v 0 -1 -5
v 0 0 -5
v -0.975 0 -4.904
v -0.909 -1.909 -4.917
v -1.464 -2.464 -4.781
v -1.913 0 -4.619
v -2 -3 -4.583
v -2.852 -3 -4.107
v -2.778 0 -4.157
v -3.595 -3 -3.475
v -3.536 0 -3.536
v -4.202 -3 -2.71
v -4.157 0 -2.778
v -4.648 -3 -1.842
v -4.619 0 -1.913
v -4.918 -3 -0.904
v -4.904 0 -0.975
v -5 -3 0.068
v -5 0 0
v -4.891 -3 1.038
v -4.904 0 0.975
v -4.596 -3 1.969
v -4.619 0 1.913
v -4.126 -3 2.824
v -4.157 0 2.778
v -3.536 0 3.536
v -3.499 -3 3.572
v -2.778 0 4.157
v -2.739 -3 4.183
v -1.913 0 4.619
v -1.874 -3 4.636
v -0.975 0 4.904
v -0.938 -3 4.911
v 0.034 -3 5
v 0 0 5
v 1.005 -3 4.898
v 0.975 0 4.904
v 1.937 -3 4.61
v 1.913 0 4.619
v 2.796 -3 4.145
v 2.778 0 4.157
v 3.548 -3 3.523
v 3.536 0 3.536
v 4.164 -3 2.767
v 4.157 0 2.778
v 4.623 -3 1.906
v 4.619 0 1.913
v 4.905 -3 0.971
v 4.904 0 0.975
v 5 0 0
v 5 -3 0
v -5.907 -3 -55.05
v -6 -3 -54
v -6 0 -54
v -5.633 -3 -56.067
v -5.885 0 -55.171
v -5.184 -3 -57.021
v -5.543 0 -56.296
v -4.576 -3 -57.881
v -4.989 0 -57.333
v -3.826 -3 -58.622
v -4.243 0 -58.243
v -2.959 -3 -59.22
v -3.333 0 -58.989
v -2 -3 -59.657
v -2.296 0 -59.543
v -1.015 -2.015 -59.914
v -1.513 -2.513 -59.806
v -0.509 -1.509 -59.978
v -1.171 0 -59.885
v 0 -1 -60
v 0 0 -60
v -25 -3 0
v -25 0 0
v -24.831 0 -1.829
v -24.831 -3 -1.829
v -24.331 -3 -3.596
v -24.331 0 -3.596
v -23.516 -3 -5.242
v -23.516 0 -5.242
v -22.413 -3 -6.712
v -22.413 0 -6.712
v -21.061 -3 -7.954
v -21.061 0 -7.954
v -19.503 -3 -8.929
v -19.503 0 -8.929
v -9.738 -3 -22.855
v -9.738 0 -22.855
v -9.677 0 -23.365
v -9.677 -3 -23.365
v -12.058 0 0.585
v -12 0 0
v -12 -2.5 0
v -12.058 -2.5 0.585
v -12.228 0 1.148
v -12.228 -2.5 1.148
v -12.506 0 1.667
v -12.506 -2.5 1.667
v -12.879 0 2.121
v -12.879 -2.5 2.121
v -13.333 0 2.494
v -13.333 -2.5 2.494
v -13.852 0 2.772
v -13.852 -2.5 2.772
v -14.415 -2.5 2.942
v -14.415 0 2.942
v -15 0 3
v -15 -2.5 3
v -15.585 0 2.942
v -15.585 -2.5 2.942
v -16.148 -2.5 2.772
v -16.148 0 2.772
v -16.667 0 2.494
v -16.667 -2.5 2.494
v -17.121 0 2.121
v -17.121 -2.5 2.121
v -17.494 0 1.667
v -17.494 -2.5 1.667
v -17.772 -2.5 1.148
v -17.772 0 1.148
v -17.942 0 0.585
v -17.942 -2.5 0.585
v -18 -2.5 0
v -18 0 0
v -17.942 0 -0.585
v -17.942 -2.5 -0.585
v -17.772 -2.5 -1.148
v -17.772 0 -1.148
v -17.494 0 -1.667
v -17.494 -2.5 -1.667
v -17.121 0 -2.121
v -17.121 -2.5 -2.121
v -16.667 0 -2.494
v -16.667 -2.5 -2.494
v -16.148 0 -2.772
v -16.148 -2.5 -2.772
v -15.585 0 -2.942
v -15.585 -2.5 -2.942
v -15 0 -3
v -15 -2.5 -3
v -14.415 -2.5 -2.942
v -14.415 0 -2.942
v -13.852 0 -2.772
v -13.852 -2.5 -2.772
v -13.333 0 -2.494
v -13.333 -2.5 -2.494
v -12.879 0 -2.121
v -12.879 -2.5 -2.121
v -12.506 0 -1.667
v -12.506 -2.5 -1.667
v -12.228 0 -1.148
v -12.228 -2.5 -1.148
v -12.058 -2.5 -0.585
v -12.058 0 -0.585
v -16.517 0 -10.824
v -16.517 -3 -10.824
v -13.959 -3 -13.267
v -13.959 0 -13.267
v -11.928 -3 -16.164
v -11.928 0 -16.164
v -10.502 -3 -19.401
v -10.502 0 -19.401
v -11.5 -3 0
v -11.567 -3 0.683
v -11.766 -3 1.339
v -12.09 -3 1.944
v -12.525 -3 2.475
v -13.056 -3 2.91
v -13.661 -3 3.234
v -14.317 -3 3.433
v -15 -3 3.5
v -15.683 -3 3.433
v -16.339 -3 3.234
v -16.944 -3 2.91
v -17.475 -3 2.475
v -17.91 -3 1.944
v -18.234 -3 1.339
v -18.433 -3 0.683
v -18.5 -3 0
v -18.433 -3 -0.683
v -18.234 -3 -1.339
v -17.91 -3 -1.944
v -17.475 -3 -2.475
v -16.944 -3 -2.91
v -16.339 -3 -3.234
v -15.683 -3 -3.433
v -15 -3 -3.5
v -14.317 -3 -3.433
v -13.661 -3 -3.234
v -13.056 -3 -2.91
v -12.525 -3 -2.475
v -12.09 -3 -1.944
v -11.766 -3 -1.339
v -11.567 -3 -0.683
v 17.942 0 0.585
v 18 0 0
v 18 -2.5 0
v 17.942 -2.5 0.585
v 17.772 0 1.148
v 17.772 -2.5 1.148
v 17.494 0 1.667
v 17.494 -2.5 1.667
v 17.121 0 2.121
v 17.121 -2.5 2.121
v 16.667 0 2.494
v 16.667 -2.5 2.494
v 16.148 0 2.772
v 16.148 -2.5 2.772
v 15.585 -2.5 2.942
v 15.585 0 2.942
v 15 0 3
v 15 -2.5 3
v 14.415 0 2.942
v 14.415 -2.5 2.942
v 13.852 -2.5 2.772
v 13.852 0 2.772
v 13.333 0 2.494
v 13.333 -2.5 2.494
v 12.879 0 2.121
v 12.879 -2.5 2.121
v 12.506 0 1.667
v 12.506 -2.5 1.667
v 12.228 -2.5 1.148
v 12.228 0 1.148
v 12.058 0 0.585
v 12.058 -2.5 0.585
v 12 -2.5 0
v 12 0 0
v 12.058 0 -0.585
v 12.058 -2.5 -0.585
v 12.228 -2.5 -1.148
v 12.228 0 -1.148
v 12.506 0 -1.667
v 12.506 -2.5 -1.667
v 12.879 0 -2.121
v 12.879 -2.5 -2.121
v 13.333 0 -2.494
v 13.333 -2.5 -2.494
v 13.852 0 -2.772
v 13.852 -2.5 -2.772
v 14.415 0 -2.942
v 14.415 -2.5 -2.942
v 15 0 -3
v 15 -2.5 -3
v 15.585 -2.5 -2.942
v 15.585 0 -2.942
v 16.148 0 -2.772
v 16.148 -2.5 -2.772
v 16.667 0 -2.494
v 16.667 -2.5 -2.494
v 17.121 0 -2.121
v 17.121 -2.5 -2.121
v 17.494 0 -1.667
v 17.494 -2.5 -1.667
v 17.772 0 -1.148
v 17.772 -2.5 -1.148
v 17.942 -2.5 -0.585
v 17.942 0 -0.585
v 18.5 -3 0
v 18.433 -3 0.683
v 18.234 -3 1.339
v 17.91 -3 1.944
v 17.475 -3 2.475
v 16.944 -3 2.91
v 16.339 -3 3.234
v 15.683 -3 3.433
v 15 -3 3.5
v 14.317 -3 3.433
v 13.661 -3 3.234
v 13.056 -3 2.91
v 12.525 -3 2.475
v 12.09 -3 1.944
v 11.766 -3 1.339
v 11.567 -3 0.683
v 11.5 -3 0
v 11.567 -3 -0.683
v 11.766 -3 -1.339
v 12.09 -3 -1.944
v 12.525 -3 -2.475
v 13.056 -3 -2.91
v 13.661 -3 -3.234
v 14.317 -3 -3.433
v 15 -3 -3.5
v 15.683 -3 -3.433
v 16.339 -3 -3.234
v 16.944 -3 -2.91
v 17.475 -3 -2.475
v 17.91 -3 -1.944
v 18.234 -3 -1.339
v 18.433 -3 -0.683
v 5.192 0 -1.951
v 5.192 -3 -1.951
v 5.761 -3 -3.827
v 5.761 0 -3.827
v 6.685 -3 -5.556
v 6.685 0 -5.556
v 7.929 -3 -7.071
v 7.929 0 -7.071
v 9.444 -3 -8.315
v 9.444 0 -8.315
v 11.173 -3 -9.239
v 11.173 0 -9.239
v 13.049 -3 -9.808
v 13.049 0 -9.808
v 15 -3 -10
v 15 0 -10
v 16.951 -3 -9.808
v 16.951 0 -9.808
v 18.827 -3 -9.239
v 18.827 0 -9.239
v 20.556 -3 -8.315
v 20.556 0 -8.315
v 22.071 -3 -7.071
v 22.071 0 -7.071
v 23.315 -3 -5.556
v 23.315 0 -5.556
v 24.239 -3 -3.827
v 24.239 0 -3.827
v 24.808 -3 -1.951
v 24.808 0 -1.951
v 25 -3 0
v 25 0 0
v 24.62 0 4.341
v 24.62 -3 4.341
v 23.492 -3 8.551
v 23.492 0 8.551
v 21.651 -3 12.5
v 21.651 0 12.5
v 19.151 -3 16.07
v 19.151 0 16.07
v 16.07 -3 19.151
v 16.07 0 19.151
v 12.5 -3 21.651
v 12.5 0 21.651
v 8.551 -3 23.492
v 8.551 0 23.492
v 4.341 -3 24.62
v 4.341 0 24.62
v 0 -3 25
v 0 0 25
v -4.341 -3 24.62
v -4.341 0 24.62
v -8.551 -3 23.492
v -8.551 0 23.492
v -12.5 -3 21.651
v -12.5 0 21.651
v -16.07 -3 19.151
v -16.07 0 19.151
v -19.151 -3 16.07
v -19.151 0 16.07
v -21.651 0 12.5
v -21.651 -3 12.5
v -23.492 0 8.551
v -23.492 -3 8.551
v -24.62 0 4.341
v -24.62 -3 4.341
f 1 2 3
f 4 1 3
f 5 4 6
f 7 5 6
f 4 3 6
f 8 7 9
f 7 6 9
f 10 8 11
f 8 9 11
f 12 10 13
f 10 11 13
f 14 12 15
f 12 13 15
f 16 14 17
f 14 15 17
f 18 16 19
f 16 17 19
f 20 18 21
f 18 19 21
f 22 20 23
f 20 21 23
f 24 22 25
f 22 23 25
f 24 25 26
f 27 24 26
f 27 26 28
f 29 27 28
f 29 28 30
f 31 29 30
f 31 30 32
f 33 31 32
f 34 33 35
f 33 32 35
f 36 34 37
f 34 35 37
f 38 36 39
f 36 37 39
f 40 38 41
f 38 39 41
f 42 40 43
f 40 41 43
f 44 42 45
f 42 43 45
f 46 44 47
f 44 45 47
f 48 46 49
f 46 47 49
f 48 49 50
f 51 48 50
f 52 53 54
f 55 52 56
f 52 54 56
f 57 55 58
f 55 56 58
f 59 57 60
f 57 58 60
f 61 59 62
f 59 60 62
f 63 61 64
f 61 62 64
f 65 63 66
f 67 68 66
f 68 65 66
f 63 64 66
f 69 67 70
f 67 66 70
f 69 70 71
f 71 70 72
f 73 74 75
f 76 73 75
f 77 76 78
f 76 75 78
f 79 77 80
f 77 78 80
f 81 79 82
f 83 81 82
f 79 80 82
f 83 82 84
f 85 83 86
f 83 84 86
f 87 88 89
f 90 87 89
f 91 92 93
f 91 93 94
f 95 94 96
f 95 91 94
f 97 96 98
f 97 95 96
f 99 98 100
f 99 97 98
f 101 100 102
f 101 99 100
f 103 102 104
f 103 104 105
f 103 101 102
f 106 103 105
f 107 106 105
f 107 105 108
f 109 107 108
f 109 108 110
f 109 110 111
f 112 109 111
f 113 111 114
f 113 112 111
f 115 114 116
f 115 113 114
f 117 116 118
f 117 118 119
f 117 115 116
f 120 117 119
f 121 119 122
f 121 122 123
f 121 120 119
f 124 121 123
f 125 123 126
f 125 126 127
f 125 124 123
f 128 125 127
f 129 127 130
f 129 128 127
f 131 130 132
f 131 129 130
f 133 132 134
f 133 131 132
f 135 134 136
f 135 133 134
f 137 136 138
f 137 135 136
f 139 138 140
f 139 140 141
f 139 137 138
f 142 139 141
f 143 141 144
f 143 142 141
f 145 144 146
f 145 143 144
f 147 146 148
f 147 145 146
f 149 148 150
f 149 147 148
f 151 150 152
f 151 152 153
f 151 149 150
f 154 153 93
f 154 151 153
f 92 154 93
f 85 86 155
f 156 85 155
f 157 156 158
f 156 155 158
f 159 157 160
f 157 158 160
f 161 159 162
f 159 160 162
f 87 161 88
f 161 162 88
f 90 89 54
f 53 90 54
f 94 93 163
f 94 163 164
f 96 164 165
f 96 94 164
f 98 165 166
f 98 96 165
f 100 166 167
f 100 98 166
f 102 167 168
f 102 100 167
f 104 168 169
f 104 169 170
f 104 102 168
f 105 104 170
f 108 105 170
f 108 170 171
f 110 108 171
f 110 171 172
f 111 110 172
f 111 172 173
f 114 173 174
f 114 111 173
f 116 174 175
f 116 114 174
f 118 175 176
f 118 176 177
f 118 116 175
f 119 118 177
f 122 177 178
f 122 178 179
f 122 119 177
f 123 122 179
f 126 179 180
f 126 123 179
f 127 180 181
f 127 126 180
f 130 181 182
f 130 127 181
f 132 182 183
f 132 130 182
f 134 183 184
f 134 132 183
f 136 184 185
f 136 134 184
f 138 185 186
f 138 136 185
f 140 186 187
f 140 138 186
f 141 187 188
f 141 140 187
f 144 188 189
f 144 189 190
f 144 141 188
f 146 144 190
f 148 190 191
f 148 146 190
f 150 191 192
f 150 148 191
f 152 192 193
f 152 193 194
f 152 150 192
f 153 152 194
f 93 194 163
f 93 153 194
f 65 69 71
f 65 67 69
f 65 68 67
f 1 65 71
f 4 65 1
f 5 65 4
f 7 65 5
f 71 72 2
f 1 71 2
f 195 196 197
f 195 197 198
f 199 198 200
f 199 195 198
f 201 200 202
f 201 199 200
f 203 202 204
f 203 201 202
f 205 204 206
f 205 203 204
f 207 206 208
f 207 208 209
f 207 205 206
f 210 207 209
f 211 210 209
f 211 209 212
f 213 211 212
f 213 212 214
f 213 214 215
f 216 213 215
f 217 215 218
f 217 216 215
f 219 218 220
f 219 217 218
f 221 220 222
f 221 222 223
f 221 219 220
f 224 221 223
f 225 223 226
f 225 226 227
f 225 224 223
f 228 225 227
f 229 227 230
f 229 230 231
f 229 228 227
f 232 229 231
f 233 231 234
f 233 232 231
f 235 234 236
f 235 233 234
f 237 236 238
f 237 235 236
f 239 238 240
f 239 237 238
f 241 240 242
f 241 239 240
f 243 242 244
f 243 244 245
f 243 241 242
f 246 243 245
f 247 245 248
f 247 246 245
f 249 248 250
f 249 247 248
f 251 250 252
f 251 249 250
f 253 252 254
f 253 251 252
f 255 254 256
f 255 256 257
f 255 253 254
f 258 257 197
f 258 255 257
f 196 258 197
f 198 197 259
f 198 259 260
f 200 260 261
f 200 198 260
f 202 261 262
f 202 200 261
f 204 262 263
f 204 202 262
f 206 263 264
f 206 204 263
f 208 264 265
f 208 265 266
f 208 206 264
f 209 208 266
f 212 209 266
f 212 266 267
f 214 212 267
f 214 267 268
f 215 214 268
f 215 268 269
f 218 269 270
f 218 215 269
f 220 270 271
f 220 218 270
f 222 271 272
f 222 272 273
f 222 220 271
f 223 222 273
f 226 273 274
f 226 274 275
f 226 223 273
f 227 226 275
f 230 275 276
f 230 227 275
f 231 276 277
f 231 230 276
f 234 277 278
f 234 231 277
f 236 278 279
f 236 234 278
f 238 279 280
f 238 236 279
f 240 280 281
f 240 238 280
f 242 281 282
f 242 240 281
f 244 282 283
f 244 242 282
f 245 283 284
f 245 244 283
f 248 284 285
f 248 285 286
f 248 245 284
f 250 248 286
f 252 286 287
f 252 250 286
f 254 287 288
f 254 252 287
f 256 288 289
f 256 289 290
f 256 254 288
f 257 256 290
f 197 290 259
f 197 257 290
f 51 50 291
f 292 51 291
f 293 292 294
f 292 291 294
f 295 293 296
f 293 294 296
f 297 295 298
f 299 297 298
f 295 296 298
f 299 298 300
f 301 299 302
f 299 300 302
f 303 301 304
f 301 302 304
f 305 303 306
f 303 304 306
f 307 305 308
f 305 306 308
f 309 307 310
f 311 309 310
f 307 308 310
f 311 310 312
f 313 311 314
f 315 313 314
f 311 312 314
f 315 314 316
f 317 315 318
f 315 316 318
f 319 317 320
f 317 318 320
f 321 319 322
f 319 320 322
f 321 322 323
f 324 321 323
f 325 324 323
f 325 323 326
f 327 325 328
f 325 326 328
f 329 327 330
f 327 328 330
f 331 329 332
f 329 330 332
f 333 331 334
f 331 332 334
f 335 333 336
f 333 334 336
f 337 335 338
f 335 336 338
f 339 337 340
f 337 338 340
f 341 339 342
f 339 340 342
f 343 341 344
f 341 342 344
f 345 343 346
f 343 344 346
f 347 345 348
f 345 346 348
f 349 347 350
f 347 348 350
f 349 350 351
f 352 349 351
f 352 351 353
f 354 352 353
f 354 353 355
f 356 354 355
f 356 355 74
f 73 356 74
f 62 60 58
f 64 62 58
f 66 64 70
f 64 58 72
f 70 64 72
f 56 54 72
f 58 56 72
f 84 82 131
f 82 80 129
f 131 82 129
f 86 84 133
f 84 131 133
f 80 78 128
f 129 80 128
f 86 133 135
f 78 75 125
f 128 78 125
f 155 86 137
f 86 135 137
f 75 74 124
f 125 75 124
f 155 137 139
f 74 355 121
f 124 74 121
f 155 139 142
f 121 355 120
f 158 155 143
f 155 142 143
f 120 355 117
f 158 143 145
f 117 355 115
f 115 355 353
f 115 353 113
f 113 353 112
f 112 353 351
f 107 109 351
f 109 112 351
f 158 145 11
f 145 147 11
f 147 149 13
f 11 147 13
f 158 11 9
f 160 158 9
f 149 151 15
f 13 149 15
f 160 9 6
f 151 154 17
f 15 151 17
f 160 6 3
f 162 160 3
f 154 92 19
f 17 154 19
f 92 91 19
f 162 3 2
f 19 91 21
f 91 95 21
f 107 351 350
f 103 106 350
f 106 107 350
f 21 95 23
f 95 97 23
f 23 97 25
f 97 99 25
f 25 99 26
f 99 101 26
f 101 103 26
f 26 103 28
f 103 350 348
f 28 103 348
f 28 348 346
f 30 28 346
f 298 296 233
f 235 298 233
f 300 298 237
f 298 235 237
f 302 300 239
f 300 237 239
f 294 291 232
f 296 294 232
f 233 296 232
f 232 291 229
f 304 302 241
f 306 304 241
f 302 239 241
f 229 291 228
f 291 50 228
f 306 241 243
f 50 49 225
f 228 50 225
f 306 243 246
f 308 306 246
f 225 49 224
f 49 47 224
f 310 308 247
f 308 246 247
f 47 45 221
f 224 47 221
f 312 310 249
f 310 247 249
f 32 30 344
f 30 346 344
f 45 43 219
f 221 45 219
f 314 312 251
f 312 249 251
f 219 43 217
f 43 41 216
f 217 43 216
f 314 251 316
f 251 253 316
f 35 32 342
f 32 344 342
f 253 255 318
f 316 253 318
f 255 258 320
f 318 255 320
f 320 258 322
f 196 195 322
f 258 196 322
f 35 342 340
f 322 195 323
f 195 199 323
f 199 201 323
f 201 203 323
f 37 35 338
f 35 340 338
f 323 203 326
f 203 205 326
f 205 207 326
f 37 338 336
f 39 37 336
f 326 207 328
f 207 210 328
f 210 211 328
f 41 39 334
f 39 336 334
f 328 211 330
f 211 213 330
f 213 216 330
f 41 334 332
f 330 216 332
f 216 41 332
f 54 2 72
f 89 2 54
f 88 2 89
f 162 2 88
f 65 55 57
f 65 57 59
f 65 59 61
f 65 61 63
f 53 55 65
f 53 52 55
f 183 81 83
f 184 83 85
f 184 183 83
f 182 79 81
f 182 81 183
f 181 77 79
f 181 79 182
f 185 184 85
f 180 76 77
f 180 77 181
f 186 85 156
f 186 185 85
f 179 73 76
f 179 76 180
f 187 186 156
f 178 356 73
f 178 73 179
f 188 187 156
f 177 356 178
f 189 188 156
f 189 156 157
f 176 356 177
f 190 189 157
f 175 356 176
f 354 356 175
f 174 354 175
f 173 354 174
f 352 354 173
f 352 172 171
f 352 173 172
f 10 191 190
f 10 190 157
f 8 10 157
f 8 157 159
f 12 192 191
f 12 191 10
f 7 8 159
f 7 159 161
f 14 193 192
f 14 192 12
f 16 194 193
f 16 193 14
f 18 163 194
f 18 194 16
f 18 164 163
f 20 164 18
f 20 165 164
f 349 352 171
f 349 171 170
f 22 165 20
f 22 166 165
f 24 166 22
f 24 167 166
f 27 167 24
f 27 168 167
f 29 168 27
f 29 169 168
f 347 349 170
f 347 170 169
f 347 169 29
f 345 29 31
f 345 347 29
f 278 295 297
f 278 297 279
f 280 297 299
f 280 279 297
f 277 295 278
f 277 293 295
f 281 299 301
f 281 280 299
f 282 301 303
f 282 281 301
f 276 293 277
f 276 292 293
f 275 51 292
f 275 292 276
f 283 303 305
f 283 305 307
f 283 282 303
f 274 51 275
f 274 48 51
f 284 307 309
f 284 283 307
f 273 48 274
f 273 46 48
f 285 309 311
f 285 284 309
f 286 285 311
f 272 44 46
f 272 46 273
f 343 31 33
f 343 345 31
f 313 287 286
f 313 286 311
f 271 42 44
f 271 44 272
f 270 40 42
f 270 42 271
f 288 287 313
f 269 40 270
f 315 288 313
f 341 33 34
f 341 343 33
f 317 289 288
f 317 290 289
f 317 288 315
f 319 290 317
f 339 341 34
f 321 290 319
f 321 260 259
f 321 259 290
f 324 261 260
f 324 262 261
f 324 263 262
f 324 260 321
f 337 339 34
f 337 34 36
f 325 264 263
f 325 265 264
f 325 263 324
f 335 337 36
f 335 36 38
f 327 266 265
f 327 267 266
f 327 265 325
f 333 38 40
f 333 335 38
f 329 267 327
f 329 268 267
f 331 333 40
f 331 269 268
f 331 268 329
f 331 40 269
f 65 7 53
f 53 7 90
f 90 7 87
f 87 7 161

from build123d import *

# Parameters (mm, degrees)
F0_R     = 3
F1_DEPTH = 3
F2_SIZE  = 2
F3_SIZE  = 0.5


with BuildPart() as f1:
    # F0 (on Front) → F1 (new body)
    with BuildSketch(Plane.XZ):
        with BuildLine():
            ThreePointArc((0, -5), (-3.535534, 3.535534), (5, 0))
            ThreePointArc((5, 0), (15, -10), (25, 0))
            ThreePointArc((25, 0), (0, 25), (-25, 0))
            ThreePointArc((-25, 0), (-23.515691, -5.242423), (-19.5034, -8.928571))
            ThreePointArc((-19.5034, -8.928571), (-12.871812, -14.665594), (-9.737763, -22.855169))
            Line((-9.737763, -22.855169), (-9.676577, -23.364999))
            Line((-9.676577, -23.364999), (-6, -54))
            ThreePointArc((-6, -54), (-4.242641, -58.242641), (0, -60))
            Line((0, -60), (0, -5))
        make_face()
        with Locations((-15, 0)):
            Circle(F0_R, mode=Mode.SUBTRACT)
        with Locations((15, 0)):
            Circle(F0_R, mode=Mode.SUBTRACT)
    extrude(amount=F1_DEPTH)

    # F2
    f2_edges = [f1.edges().sort_by_distance(p)[0] for p in [
        (0, -3, -32.5),
    ]]
    chamfer(f2_edges, length=F2_SIZE)

    # F3
    f3_edges = [f1.edges().sort_by_distance(p)[0] for p in [
        (-18, -3, 0),
        (12, -3, 0),
    ]]
    chamfer(f3_edges, length=F3_SIZE)


solid = f1.part
